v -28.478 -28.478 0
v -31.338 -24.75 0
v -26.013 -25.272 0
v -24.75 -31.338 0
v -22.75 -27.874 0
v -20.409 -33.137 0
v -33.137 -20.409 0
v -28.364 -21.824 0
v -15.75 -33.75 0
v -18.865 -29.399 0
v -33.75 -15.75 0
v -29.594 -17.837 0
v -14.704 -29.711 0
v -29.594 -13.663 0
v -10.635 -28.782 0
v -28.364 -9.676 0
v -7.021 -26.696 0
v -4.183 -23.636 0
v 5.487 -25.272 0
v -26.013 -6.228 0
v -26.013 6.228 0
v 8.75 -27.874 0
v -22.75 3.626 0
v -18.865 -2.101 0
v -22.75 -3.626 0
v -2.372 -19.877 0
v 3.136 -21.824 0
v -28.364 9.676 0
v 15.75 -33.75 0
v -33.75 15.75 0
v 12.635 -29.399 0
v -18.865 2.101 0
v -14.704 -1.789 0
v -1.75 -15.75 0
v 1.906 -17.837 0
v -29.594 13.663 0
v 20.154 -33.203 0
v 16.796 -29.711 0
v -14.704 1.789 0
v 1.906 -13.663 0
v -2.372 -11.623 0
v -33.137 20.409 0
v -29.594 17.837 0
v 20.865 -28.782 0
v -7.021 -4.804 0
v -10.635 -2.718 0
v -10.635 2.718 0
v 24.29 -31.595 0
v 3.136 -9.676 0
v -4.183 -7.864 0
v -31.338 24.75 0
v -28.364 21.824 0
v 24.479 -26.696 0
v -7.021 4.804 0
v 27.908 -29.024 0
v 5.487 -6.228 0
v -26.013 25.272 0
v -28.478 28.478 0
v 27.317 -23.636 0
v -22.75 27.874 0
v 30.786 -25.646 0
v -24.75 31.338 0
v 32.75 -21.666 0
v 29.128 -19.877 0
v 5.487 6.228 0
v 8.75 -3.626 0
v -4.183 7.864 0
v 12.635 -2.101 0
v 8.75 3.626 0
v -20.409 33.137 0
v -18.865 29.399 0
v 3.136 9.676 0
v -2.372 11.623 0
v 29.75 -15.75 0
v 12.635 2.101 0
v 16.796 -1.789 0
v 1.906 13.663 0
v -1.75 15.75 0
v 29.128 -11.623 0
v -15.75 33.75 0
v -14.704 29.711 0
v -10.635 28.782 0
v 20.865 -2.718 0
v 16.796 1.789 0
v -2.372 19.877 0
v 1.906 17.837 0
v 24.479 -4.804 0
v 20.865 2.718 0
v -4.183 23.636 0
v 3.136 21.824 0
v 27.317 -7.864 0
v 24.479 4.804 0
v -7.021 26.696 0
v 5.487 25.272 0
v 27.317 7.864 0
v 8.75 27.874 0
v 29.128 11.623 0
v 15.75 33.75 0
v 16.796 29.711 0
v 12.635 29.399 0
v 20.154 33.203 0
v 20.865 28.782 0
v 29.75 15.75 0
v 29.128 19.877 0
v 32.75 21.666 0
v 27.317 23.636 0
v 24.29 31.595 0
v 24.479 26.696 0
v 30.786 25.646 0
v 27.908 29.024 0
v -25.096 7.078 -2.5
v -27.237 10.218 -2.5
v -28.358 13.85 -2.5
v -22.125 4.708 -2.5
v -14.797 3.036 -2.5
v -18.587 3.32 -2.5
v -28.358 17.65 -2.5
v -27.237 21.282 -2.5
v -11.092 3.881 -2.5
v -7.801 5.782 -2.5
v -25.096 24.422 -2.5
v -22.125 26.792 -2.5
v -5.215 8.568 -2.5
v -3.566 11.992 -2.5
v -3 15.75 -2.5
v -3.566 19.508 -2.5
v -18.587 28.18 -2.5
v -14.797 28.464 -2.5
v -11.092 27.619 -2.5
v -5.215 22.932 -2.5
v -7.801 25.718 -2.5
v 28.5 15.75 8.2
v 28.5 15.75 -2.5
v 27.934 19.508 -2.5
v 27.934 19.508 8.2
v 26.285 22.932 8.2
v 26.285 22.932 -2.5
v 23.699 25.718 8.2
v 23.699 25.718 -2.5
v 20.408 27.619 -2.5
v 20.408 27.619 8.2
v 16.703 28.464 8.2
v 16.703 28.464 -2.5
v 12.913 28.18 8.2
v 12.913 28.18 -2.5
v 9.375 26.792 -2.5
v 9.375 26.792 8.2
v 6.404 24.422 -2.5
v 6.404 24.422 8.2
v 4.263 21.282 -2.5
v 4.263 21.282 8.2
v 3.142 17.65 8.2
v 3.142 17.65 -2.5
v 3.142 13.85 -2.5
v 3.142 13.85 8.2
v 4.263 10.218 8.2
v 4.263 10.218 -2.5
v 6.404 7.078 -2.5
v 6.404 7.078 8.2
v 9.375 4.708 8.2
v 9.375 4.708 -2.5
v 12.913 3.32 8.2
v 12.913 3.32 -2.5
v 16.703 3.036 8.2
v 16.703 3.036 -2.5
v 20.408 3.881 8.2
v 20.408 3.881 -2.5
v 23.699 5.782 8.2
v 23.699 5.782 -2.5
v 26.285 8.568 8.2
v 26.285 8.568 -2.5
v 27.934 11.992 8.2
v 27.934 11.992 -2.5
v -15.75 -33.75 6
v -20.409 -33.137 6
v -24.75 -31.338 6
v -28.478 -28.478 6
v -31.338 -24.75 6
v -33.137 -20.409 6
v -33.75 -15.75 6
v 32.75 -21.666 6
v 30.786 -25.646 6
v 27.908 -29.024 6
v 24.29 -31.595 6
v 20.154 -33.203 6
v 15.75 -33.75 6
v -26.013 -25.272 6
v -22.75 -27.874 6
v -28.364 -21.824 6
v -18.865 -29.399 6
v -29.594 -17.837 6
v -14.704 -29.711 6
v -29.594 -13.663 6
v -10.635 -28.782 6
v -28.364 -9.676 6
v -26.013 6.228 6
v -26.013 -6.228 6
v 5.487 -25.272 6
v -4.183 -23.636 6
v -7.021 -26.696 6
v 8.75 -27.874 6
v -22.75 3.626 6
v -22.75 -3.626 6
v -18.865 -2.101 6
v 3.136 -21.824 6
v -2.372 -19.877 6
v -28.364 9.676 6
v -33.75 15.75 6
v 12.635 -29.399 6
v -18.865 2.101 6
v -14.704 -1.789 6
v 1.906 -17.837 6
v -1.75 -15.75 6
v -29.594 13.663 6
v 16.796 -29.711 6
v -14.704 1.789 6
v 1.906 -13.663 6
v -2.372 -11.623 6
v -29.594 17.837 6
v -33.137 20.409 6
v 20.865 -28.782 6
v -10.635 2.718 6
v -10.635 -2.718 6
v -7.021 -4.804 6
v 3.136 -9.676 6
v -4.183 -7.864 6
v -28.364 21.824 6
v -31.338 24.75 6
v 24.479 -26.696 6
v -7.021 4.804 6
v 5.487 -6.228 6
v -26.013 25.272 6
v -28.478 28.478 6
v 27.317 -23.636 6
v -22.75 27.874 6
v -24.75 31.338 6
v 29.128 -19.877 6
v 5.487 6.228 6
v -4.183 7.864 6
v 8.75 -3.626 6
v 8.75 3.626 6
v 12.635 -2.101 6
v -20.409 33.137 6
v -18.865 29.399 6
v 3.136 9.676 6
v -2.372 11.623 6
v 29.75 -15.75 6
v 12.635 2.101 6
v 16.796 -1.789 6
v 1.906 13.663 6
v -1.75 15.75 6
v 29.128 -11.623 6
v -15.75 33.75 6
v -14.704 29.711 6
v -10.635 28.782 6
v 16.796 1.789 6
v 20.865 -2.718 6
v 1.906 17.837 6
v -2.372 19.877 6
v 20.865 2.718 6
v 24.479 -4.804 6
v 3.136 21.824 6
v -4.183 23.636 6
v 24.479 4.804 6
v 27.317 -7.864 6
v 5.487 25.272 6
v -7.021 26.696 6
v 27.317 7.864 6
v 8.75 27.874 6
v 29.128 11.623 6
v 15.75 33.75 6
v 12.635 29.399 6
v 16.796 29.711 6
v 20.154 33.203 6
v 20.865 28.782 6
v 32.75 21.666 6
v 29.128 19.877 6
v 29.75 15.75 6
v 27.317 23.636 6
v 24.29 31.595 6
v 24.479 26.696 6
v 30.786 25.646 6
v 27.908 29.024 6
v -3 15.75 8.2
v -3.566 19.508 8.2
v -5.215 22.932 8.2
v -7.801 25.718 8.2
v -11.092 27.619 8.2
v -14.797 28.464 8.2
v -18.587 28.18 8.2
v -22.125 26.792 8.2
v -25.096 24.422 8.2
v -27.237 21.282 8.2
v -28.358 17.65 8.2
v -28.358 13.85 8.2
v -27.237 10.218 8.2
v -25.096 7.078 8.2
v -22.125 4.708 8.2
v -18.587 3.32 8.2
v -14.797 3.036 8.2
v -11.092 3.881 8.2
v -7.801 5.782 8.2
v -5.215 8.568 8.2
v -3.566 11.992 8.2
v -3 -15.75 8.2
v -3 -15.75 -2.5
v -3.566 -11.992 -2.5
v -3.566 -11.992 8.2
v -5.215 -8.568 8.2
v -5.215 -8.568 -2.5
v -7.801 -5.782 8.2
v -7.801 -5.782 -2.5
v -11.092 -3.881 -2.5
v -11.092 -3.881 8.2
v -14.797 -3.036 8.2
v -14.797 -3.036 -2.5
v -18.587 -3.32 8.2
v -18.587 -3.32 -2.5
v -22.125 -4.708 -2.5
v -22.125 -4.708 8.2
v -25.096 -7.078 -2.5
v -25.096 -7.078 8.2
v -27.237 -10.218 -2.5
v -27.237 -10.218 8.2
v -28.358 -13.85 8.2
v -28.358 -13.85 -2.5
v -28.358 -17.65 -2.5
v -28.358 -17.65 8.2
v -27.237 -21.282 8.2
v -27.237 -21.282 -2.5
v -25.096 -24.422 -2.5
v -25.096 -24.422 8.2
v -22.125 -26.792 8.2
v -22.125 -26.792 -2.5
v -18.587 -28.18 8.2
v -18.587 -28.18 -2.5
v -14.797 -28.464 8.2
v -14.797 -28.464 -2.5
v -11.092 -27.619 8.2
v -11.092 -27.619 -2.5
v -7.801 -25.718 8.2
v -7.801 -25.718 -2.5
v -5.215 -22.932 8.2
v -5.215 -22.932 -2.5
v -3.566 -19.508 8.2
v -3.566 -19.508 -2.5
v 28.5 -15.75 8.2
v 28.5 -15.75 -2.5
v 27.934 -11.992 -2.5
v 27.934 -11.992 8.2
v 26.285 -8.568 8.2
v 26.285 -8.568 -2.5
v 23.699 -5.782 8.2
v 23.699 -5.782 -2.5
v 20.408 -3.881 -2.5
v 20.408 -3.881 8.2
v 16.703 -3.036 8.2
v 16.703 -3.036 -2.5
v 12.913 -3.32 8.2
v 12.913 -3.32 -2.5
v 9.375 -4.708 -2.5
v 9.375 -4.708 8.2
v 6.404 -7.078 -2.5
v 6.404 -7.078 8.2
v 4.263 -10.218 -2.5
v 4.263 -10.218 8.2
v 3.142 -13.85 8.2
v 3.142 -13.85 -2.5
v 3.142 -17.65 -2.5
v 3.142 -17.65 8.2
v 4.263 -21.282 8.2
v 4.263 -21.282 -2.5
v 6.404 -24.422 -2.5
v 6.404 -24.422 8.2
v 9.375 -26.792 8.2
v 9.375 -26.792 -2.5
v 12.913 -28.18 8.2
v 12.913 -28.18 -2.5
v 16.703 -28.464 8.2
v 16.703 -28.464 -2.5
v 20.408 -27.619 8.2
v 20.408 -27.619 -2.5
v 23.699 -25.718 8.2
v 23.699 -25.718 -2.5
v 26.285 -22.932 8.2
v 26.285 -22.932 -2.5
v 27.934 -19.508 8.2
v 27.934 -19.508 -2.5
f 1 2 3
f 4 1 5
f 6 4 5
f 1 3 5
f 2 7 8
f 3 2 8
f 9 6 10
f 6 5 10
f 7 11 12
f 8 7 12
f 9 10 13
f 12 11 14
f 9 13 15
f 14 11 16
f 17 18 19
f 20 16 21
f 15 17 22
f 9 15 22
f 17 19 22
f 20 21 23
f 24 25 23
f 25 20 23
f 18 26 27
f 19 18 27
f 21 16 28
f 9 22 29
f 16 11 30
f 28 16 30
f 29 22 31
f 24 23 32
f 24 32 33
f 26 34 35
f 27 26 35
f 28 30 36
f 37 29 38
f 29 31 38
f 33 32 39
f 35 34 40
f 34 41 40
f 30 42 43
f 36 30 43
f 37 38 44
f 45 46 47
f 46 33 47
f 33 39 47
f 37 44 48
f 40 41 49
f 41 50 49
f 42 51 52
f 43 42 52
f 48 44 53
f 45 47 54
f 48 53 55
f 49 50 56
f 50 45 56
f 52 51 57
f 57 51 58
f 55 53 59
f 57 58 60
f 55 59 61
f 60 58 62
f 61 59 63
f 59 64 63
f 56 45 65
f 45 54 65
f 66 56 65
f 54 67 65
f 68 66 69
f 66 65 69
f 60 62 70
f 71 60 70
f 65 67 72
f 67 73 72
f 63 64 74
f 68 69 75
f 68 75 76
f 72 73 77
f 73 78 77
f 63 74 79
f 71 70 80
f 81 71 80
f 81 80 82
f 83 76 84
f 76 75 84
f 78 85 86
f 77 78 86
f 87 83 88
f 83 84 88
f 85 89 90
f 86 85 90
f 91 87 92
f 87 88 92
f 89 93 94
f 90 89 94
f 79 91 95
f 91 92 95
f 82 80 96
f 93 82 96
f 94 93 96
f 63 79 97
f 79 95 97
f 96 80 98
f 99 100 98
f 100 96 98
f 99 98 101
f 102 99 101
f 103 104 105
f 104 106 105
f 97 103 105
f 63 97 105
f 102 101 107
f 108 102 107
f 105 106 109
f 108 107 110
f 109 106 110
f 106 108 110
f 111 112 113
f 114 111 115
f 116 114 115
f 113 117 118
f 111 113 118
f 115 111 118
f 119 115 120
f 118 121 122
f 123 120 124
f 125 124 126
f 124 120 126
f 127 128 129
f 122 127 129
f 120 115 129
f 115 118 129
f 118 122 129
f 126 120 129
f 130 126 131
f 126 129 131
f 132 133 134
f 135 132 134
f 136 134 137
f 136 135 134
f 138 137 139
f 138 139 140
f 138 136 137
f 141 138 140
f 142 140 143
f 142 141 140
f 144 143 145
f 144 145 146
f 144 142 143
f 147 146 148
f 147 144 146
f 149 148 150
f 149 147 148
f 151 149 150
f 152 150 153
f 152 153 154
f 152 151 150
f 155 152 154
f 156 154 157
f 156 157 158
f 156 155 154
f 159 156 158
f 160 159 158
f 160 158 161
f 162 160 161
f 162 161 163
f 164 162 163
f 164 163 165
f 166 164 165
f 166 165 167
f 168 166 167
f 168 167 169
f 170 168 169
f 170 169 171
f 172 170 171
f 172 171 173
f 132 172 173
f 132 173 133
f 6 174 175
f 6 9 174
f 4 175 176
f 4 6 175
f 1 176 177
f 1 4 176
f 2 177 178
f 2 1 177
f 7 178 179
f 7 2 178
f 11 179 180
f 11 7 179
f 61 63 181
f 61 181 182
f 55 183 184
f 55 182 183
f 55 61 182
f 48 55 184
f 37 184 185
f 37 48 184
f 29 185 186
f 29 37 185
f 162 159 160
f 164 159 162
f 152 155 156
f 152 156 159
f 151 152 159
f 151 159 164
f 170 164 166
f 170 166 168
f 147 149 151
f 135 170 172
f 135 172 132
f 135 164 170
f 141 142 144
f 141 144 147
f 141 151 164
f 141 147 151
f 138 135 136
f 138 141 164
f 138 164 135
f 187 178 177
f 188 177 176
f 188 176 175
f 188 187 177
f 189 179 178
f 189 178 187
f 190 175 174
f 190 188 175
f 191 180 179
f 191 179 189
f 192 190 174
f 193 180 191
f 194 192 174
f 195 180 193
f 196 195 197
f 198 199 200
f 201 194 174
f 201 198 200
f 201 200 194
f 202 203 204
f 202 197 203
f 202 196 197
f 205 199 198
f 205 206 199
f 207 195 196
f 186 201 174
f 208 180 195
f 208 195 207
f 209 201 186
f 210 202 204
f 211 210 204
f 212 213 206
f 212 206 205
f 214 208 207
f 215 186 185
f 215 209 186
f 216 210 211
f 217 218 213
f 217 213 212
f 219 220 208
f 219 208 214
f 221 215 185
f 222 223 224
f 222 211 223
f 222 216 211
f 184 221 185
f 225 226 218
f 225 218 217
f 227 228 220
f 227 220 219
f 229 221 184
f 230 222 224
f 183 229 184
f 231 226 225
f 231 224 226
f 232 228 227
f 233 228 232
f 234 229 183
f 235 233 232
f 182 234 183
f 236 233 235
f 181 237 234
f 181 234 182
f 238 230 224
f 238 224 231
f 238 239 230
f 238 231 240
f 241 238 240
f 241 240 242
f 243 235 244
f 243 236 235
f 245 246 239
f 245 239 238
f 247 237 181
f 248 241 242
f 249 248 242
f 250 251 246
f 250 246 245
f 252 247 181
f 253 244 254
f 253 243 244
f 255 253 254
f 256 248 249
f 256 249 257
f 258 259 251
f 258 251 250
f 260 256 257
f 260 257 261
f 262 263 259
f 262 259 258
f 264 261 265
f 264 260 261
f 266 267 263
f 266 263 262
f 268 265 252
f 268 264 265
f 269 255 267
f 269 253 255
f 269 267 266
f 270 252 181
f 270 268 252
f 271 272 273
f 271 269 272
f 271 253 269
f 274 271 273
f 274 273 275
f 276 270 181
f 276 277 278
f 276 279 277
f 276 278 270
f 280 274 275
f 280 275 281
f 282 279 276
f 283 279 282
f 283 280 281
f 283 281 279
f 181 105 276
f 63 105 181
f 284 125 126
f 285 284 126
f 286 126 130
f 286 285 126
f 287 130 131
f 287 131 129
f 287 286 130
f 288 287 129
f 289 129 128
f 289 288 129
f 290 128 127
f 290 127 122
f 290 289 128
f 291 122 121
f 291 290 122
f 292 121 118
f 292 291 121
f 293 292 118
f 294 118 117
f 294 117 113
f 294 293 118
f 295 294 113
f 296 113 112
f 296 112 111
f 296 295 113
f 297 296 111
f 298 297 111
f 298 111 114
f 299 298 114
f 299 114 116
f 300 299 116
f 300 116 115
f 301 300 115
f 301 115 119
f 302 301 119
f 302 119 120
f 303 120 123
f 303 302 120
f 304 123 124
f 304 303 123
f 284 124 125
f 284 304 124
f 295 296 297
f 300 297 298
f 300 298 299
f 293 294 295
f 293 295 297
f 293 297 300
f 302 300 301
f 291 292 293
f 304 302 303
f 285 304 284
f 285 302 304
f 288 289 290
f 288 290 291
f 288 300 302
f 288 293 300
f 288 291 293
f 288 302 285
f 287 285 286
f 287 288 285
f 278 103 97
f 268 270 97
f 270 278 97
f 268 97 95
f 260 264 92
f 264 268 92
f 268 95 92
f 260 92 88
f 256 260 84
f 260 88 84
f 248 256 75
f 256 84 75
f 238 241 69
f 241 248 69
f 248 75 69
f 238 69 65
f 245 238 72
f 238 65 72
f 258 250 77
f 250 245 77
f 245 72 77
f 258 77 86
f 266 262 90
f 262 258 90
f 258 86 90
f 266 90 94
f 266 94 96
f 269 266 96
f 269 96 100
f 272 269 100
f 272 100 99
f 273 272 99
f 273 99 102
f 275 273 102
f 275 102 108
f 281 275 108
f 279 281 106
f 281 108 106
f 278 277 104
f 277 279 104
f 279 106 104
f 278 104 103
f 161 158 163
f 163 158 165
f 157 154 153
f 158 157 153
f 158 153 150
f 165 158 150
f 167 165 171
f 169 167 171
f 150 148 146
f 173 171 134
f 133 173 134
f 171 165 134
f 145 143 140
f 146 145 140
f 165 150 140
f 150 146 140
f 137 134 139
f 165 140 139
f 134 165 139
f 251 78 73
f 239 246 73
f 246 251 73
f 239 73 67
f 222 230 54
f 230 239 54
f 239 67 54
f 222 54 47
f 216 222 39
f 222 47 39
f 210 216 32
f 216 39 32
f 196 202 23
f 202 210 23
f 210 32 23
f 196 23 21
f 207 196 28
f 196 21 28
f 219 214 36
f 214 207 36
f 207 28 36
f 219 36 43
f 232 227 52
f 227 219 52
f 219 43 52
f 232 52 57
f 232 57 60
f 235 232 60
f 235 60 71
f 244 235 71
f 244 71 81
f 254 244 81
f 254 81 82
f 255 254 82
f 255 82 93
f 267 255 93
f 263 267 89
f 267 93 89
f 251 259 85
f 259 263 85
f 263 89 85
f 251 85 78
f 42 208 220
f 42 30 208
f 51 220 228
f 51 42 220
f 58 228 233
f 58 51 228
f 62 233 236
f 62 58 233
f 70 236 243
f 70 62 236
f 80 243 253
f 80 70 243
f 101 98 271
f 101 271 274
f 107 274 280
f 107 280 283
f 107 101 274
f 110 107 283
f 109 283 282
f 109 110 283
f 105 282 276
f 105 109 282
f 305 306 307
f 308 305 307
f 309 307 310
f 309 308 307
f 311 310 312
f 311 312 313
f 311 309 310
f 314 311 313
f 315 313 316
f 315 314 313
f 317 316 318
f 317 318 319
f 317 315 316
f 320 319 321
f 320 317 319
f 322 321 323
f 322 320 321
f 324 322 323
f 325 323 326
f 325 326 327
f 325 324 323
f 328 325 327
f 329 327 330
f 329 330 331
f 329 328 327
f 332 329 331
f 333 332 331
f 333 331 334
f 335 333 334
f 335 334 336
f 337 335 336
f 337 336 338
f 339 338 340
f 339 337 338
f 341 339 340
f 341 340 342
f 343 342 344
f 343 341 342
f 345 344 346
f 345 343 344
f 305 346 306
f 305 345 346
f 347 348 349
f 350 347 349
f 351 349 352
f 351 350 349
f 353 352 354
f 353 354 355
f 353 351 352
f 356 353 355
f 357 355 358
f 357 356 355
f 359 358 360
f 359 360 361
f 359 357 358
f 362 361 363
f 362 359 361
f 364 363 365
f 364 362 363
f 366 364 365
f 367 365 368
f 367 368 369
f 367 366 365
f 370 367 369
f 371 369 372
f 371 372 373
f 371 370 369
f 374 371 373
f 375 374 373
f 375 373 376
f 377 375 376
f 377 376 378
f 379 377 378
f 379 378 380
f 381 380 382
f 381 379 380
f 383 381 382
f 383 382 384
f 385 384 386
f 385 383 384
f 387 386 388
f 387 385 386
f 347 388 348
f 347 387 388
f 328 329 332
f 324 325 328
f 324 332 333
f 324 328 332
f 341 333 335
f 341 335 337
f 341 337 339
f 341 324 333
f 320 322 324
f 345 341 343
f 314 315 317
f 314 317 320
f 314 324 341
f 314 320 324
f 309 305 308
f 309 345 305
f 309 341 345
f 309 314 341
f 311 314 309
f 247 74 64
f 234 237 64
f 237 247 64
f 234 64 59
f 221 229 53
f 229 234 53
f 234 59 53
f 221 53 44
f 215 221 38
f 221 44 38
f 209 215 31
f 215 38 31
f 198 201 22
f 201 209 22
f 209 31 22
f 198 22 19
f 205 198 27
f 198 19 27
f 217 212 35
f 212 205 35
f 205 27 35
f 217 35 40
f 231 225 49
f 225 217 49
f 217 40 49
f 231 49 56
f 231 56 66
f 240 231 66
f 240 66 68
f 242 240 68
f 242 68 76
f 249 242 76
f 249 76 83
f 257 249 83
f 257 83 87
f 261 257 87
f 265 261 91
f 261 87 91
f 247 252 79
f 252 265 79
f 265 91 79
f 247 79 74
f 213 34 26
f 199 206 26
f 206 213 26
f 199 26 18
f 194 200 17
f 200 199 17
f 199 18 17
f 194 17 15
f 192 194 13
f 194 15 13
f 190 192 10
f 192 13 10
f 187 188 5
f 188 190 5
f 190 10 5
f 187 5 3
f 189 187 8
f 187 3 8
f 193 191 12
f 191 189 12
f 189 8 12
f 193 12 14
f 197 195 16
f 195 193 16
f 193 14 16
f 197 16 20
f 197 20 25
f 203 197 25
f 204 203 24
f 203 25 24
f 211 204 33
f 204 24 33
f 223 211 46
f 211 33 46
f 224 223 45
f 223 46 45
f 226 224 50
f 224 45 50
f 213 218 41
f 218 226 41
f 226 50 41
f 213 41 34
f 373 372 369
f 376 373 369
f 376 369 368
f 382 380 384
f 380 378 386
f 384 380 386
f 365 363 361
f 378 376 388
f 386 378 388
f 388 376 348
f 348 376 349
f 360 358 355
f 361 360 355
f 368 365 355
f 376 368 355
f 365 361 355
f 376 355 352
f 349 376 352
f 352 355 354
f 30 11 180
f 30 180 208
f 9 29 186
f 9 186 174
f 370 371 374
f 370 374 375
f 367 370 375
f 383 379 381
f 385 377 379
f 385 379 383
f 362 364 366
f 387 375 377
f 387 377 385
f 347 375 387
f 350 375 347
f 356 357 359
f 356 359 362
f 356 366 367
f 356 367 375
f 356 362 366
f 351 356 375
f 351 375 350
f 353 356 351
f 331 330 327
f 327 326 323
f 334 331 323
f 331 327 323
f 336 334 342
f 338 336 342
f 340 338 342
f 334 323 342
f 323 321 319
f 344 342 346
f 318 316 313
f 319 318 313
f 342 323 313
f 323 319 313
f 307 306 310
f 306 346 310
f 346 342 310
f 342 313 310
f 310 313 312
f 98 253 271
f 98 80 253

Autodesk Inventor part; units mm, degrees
ref_plane "YZ Plane" through (0, 0, 0) normal (1, 0, 0) x (0, 1, 0)
ref_plane "XZ Plane" through (0, 0, 0) normal (0, 1, 0) x (-1, 0, 0)
ref_plane "XY Plane" through (0, 0, 0) normal (0, 0, 1) x (1, 0, 0)
sketch "Skizze1" plane through (0, 0, 0) normal (0, 0, 1) x (1, 0, 0)
  line L0 (-33.75, 33.75) -> (33.75, 33.75)
  line L1 (33.75, 33.75) -> (33.75, -33.75)
  line L2 (33.75, -33.75) -> (-33.75, -33.75)
  line L3 (-33.75, -33.75) -> (-33.75, 33.75)
  circle A0 centre (-15.75, 15.75) radius 18 construction
  circle A1 centre (15.75, 15.75) radius 18 construction
  circle A2 centre (-15.75, -15.75) radius 18 construction
  circle A3 centre (15.75, -15.75) radius 18 construction
  arc A4 (-15.75, 33.75) -> (-33.75, 15.75) centre (-15.75, 15.75) ccw
  arc A5 (33.75, 15.75) -> (15.75, 33.75) centre (15.75, 15.75) ccw
  arc A6 (-33.75, -15.75) -> (-15.75, -33.75) centre (-15.75, -15.75) ccw
  arc A7 (15.75, -33.75) -> (33.75, -15.75) centre (15.75, -15.75) ccw
  circle A8 centre (-15.75, 15.75) radius 14
  circle A9 centre (15.75, 15.75) radius 14
  circle A10 centre (-15.75, -15.75) radius 14
  circle A11 centre (15.75, -15.75) radius 14
  circle A12 centre (-15.75, 15.75) radius 12.75
  circle A13 centre (15.75, 15.75) radius 12.75
  circle A14 centre (-15.75, -15.75) radius 12.75
  circle A15 centre (15.75, -15.75) radius 12.75
  line L4 (33.75, 0) -> (-33.75, 0) construction
  line L5 (0, 33.75) -> (0, -33.75) construction
  line L6 (33.75, 33.75) -> (32.75, 33.75)
  line L7 (32.75, 33.75) -> (32.75, -33.75)
  line L8 (32.75, -33.75) -> (33.75, -33.75)
  line L9 (33.75, -33.75) -> (33.75, 33.75)
  circle A16 centre (0, -30) radius 1 construction
  circle A17 centre (0, 30) radius 1 construction
  line L10 (0, -30) -> (0, 30) construction
  point P0 (0, 0)
  point P1 (0, 0)
  dimension "d0" = 67.5
  dimension "d1" = 67.5
  dimension "d2" = 36
  dimension "d3" = 28
  dimension "d4" = 28
  dimension "d5" = 28
  dimension "d6" = 28
  dimension "d9" = 25.5
  dimension "d14" = 1
  dimension "d17" = 2
  dimension "d18" = 60
  dimension "d19" = 15.75
extrude "Extrusion1" add sketch "Skizze1" along normal blind 6 contours L0 A5 L7 A7 L2 A6 L3 A4 | A5 L1 A7 L7
extrude "Extrusion2" add sketch "Skizze1" against normal blind 2.5 contours A12 | A13 | A14 | A15
extrude "Extrusion3" add sketch "Skizze1" along normal blind 8.2 contours A12 | A13 | A14 | A15
extrude "Extrusion4" cut sketch "Skizze1" along normal through all contours L0 L1 A5 L7 | A5 L1 A7 L7 | A7 L1 L2 L7
equation "\"d1\" = d0"
equation "\"d3\" = d4"
equation "\"d5\" = d3"
equation "\"d6\" = d4"
properties part number "daVinciTool_Aufnahme_ClutchPart"
